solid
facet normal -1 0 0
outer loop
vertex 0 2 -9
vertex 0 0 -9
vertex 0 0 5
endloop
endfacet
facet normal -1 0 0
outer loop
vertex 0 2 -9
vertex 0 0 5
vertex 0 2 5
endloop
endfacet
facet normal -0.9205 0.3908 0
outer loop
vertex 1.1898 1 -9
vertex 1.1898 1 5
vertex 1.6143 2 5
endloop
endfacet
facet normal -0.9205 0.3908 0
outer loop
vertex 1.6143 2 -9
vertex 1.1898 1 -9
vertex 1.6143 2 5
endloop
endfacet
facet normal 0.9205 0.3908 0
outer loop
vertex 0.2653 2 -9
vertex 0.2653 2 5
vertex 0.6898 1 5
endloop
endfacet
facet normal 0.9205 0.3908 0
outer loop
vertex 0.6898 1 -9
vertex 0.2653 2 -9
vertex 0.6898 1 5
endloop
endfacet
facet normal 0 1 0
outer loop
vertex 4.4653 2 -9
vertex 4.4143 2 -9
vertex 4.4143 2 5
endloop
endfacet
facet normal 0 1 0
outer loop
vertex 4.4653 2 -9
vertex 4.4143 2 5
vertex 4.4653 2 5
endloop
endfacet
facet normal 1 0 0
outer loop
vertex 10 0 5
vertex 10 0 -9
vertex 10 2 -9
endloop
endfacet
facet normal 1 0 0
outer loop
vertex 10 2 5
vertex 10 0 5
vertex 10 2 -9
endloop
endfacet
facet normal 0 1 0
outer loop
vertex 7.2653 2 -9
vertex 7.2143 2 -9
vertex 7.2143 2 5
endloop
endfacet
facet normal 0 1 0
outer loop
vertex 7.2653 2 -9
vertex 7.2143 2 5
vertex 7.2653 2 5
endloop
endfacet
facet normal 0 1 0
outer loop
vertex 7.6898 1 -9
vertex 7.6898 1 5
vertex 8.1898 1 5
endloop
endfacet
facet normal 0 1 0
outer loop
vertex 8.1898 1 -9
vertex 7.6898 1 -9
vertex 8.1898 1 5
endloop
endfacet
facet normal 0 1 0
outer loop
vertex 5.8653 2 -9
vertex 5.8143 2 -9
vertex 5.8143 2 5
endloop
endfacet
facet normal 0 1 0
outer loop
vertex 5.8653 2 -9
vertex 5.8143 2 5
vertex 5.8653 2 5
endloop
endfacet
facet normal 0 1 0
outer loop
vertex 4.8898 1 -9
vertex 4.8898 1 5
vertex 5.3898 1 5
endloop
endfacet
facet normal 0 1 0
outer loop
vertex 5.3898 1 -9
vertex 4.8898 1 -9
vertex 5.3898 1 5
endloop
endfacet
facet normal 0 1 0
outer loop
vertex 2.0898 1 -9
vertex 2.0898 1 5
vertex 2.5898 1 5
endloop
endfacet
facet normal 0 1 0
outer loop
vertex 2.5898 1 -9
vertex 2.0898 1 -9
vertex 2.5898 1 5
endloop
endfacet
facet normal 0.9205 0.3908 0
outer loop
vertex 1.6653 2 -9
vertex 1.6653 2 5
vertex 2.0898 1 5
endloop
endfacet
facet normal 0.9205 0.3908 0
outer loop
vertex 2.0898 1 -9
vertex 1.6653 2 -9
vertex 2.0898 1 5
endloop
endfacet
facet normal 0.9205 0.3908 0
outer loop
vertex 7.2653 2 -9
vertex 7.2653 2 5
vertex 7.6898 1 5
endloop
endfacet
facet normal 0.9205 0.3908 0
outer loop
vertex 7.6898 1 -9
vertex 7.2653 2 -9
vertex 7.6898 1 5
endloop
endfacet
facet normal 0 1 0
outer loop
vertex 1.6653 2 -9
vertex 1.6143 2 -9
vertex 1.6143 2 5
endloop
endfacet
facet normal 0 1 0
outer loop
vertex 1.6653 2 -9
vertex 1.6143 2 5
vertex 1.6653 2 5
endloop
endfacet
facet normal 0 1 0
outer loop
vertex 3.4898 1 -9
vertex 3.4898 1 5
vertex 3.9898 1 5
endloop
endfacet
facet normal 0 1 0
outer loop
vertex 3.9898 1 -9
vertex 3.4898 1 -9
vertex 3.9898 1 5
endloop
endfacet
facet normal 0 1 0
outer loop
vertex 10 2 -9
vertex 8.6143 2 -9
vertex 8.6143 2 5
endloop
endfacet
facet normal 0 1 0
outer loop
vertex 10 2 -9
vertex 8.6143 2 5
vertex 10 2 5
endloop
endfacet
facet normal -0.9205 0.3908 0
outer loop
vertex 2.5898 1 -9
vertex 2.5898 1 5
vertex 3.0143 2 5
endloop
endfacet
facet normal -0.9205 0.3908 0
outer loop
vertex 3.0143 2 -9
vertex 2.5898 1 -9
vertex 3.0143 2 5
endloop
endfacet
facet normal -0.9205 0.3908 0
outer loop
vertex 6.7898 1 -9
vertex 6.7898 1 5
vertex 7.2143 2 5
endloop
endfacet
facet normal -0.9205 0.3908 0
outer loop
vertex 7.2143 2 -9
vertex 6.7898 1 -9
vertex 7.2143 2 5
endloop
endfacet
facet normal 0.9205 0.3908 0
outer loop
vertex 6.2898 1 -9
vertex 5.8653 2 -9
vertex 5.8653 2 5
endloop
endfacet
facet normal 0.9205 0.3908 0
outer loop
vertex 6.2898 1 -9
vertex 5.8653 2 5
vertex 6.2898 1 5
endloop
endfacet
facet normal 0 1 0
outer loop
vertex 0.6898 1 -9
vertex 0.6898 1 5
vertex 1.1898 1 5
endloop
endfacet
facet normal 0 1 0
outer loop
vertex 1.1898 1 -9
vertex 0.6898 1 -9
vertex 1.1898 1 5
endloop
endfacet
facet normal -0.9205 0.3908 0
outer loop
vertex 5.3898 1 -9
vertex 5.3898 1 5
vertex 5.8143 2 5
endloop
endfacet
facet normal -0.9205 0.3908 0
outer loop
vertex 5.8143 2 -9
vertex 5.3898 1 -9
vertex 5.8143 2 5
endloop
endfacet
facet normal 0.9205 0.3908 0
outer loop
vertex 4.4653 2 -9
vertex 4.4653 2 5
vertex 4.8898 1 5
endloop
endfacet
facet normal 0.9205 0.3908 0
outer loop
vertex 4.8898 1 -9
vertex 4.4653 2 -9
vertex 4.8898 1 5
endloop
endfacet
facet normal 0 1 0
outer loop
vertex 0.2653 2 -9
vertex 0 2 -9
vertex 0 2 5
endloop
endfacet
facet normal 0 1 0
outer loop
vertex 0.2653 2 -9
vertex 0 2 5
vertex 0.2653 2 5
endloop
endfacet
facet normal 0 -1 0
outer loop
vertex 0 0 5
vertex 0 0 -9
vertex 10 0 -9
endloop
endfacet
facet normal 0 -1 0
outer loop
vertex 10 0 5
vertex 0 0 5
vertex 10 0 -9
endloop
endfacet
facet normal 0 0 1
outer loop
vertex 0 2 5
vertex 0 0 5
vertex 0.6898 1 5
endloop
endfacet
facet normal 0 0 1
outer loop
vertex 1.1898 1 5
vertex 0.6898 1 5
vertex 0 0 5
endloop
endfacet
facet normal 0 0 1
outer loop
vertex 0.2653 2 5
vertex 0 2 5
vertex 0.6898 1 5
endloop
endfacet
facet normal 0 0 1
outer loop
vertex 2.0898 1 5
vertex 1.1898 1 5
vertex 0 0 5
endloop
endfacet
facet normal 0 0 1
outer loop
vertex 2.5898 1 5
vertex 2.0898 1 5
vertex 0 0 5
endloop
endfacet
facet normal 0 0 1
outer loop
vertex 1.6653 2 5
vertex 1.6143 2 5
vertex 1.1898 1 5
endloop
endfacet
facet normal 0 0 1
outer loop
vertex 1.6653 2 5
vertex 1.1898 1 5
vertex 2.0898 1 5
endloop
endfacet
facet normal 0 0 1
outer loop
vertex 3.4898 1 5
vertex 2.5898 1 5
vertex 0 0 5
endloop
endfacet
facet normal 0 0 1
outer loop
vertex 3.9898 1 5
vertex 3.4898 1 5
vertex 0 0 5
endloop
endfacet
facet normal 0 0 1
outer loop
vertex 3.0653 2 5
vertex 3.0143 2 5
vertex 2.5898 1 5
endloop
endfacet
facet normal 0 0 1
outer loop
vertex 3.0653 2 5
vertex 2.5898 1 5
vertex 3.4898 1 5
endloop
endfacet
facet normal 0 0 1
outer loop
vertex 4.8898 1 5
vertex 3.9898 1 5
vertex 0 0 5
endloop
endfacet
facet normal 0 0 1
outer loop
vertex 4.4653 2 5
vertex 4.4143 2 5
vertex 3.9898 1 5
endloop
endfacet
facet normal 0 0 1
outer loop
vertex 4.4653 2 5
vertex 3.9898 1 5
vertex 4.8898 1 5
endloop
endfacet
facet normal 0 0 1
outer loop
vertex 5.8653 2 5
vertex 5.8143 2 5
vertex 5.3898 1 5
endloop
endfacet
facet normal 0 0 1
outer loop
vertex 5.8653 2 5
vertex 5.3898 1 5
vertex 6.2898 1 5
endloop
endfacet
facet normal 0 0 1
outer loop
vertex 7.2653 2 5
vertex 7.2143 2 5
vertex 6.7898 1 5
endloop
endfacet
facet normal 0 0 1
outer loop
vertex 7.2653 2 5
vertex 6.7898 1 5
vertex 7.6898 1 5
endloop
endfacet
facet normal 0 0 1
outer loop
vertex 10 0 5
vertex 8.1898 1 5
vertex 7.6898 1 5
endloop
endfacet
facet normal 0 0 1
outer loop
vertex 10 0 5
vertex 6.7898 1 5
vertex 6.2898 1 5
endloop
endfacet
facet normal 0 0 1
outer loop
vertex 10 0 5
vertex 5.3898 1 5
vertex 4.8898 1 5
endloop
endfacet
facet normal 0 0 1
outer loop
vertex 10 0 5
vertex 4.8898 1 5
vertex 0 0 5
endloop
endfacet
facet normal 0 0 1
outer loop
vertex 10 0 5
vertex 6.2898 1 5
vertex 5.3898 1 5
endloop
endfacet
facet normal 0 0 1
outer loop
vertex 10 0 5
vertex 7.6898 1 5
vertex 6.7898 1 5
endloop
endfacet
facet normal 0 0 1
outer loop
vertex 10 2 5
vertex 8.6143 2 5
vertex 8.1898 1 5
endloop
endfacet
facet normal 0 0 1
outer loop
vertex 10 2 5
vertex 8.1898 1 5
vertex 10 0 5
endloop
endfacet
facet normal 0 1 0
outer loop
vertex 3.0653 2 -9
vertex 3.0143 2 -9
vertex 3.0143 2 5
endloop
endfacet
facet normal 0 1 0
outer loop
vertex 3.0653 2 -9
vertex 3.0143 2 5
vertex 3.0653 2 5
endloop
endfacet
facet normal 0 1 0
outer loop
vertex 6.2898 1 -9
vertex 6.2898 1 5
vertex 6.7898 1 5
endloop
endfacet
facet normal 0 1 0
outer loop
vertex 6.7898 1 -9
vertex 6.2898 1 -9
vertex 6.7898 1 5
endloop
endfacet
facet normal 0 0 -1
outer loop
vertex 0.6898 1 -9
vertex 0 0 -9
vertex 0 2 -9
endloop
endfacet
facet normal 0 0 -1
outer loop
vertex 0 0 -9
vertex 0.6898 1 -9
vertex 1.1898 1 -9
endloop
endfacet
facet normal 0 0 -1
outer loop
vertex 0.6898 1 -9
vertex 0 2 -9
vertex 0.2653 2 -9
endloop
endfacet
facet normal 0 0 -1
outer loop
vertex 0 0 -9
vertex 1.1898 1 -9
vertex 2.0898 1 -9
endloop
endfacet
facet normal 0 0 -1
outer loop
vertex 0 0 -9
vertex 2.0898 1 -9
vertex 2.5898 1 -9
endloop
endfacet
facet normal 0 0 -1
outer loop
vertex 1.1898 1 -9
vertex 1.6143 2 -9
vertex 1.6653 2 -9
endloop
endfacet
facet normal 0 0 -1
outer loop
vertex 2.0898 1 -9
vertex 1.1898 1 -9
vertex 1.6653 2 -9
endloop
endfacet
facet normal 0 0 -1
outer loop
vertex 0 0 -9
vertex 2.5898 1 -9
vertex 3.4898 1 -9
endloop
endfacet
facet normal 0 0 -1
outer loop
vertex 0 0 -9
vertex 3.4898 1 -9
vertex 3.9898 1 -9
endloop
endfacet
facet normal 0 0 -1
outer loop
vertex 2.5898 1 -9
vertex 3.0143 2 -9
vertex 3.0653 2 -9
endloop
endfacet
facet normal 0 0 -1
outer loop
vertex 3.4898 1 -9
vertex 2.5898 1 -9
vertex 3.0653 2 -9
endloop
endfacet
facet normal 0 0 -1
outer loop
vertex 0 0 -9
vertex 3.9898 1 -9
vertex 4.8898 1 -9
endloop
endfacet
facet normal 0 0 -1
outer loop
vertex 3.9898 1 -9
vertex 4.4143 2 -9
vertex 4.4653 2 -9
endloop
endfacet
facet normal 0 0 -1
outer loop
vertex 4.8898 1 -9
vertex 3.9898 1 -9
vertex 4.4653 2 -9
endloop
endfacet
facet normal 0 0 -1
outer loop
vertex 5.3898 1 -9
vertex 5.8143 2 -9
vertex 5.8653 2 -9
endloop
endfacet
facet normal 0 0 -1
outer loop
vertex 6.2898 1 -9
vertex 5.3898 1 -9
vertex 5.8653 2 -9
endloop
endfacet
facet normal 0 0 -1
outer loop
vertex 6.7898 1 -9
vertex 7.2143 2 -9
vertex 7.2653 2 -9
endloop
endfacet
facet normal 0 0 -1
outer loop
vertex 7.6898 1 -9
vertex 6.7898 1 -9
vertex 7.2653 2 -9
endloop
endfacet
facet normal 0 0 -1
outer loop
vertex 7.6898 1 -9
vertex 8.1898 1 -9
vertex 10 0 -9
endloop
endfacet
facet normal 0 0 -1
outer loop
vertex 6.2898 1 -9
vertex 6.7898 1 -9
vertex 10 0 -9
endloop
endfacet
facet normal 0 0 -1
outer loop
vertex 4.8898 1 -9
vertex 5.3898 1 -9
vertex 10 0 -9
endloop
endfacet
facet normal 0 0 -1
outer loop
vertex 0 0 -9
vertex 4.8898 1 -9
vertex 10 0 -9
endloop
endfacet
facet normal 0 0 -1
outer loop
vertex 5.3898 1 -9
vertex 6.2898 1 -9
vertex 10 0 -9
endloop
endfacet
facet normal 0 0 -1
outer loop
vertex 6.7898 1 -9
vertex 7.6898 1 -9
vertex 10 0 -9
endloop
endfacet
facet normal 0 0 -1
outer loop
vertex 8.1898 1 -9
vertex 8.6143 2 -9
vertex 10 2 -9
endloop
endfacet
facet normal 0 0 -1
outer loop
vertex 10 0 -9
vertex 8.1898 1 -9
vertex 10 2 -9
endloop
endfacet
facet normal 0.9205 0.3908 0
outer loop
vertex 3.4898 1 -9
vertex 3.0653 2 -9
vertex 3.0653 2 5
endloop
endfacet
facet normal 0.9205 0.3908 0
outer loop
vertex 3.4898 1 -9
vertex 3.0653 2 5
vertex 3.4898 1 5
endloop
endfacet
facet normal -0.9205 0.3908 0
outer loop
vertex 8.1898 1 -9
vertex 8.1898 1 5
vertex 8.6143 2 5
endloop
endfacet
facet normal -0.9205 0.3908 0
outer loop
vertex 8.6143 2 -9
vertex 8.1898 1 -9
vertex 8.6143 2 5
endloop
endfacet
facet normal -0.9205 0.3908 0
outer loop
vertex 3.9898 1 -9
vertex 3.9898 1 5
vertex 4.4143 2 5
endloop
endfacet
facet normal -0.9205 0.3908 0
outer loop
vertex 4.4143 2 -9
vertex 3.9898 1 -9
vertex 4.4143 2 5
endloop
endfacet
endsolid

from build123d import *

# Parameters (mm, degrees)
BOSS_EXTRUDE1_DEPTH      = 5
BOSS_EXTRUDE1_DEPTH_BACK = 9
SKETCH1_W                = 10
SKETCH1_H                = 2
CUT_EXTRUDE1_DEPTH       = 18
LPATTERN2_COUNT          = 6
LPATTERN2_PITCH          = 1.4


with BuildPart() as part:
    # Sketch1 → Boss-Extrude1 (new, two sides: drawn at the far end of the back side and taken through both)
    with BuildSketch(Plane.XY.offset(-BOSS_EXTRUDE1_DEPTH_BACK)):
        with Locations((5, 1)):
            Rectangle(SKETCH1_W, SKETCH1_H)
    extrude(amount=BOSS_EXTRUDE1_DEPTH + BOSS_EXTRUDE1_DEPTH_BACK)

    # Sketch3 → Cut-Extrude1 (cut)
    with BuildSketch(Plane.XY.offset(5)):
        Polygon((0.689824634, 1), (1.189824634, 1), (1.619628875, 2.012555339), (0.260020392, 2.012555339), align=None)
    cut_extrude1 = extrude(amount=-CUT_EXTRUDE1_DEPTH, mode=Mode.SUBTRACT)

    # LPattern2: Cut-Extrude1 ×6
    with Locations(*[(i * LPATTERN2_PITCH, 0, 0) for i in range(1, LPATTERN2_COUNT)]):
        add(cut_extrude1, mode=Mode.SUBTRACT)


solid = part.part
